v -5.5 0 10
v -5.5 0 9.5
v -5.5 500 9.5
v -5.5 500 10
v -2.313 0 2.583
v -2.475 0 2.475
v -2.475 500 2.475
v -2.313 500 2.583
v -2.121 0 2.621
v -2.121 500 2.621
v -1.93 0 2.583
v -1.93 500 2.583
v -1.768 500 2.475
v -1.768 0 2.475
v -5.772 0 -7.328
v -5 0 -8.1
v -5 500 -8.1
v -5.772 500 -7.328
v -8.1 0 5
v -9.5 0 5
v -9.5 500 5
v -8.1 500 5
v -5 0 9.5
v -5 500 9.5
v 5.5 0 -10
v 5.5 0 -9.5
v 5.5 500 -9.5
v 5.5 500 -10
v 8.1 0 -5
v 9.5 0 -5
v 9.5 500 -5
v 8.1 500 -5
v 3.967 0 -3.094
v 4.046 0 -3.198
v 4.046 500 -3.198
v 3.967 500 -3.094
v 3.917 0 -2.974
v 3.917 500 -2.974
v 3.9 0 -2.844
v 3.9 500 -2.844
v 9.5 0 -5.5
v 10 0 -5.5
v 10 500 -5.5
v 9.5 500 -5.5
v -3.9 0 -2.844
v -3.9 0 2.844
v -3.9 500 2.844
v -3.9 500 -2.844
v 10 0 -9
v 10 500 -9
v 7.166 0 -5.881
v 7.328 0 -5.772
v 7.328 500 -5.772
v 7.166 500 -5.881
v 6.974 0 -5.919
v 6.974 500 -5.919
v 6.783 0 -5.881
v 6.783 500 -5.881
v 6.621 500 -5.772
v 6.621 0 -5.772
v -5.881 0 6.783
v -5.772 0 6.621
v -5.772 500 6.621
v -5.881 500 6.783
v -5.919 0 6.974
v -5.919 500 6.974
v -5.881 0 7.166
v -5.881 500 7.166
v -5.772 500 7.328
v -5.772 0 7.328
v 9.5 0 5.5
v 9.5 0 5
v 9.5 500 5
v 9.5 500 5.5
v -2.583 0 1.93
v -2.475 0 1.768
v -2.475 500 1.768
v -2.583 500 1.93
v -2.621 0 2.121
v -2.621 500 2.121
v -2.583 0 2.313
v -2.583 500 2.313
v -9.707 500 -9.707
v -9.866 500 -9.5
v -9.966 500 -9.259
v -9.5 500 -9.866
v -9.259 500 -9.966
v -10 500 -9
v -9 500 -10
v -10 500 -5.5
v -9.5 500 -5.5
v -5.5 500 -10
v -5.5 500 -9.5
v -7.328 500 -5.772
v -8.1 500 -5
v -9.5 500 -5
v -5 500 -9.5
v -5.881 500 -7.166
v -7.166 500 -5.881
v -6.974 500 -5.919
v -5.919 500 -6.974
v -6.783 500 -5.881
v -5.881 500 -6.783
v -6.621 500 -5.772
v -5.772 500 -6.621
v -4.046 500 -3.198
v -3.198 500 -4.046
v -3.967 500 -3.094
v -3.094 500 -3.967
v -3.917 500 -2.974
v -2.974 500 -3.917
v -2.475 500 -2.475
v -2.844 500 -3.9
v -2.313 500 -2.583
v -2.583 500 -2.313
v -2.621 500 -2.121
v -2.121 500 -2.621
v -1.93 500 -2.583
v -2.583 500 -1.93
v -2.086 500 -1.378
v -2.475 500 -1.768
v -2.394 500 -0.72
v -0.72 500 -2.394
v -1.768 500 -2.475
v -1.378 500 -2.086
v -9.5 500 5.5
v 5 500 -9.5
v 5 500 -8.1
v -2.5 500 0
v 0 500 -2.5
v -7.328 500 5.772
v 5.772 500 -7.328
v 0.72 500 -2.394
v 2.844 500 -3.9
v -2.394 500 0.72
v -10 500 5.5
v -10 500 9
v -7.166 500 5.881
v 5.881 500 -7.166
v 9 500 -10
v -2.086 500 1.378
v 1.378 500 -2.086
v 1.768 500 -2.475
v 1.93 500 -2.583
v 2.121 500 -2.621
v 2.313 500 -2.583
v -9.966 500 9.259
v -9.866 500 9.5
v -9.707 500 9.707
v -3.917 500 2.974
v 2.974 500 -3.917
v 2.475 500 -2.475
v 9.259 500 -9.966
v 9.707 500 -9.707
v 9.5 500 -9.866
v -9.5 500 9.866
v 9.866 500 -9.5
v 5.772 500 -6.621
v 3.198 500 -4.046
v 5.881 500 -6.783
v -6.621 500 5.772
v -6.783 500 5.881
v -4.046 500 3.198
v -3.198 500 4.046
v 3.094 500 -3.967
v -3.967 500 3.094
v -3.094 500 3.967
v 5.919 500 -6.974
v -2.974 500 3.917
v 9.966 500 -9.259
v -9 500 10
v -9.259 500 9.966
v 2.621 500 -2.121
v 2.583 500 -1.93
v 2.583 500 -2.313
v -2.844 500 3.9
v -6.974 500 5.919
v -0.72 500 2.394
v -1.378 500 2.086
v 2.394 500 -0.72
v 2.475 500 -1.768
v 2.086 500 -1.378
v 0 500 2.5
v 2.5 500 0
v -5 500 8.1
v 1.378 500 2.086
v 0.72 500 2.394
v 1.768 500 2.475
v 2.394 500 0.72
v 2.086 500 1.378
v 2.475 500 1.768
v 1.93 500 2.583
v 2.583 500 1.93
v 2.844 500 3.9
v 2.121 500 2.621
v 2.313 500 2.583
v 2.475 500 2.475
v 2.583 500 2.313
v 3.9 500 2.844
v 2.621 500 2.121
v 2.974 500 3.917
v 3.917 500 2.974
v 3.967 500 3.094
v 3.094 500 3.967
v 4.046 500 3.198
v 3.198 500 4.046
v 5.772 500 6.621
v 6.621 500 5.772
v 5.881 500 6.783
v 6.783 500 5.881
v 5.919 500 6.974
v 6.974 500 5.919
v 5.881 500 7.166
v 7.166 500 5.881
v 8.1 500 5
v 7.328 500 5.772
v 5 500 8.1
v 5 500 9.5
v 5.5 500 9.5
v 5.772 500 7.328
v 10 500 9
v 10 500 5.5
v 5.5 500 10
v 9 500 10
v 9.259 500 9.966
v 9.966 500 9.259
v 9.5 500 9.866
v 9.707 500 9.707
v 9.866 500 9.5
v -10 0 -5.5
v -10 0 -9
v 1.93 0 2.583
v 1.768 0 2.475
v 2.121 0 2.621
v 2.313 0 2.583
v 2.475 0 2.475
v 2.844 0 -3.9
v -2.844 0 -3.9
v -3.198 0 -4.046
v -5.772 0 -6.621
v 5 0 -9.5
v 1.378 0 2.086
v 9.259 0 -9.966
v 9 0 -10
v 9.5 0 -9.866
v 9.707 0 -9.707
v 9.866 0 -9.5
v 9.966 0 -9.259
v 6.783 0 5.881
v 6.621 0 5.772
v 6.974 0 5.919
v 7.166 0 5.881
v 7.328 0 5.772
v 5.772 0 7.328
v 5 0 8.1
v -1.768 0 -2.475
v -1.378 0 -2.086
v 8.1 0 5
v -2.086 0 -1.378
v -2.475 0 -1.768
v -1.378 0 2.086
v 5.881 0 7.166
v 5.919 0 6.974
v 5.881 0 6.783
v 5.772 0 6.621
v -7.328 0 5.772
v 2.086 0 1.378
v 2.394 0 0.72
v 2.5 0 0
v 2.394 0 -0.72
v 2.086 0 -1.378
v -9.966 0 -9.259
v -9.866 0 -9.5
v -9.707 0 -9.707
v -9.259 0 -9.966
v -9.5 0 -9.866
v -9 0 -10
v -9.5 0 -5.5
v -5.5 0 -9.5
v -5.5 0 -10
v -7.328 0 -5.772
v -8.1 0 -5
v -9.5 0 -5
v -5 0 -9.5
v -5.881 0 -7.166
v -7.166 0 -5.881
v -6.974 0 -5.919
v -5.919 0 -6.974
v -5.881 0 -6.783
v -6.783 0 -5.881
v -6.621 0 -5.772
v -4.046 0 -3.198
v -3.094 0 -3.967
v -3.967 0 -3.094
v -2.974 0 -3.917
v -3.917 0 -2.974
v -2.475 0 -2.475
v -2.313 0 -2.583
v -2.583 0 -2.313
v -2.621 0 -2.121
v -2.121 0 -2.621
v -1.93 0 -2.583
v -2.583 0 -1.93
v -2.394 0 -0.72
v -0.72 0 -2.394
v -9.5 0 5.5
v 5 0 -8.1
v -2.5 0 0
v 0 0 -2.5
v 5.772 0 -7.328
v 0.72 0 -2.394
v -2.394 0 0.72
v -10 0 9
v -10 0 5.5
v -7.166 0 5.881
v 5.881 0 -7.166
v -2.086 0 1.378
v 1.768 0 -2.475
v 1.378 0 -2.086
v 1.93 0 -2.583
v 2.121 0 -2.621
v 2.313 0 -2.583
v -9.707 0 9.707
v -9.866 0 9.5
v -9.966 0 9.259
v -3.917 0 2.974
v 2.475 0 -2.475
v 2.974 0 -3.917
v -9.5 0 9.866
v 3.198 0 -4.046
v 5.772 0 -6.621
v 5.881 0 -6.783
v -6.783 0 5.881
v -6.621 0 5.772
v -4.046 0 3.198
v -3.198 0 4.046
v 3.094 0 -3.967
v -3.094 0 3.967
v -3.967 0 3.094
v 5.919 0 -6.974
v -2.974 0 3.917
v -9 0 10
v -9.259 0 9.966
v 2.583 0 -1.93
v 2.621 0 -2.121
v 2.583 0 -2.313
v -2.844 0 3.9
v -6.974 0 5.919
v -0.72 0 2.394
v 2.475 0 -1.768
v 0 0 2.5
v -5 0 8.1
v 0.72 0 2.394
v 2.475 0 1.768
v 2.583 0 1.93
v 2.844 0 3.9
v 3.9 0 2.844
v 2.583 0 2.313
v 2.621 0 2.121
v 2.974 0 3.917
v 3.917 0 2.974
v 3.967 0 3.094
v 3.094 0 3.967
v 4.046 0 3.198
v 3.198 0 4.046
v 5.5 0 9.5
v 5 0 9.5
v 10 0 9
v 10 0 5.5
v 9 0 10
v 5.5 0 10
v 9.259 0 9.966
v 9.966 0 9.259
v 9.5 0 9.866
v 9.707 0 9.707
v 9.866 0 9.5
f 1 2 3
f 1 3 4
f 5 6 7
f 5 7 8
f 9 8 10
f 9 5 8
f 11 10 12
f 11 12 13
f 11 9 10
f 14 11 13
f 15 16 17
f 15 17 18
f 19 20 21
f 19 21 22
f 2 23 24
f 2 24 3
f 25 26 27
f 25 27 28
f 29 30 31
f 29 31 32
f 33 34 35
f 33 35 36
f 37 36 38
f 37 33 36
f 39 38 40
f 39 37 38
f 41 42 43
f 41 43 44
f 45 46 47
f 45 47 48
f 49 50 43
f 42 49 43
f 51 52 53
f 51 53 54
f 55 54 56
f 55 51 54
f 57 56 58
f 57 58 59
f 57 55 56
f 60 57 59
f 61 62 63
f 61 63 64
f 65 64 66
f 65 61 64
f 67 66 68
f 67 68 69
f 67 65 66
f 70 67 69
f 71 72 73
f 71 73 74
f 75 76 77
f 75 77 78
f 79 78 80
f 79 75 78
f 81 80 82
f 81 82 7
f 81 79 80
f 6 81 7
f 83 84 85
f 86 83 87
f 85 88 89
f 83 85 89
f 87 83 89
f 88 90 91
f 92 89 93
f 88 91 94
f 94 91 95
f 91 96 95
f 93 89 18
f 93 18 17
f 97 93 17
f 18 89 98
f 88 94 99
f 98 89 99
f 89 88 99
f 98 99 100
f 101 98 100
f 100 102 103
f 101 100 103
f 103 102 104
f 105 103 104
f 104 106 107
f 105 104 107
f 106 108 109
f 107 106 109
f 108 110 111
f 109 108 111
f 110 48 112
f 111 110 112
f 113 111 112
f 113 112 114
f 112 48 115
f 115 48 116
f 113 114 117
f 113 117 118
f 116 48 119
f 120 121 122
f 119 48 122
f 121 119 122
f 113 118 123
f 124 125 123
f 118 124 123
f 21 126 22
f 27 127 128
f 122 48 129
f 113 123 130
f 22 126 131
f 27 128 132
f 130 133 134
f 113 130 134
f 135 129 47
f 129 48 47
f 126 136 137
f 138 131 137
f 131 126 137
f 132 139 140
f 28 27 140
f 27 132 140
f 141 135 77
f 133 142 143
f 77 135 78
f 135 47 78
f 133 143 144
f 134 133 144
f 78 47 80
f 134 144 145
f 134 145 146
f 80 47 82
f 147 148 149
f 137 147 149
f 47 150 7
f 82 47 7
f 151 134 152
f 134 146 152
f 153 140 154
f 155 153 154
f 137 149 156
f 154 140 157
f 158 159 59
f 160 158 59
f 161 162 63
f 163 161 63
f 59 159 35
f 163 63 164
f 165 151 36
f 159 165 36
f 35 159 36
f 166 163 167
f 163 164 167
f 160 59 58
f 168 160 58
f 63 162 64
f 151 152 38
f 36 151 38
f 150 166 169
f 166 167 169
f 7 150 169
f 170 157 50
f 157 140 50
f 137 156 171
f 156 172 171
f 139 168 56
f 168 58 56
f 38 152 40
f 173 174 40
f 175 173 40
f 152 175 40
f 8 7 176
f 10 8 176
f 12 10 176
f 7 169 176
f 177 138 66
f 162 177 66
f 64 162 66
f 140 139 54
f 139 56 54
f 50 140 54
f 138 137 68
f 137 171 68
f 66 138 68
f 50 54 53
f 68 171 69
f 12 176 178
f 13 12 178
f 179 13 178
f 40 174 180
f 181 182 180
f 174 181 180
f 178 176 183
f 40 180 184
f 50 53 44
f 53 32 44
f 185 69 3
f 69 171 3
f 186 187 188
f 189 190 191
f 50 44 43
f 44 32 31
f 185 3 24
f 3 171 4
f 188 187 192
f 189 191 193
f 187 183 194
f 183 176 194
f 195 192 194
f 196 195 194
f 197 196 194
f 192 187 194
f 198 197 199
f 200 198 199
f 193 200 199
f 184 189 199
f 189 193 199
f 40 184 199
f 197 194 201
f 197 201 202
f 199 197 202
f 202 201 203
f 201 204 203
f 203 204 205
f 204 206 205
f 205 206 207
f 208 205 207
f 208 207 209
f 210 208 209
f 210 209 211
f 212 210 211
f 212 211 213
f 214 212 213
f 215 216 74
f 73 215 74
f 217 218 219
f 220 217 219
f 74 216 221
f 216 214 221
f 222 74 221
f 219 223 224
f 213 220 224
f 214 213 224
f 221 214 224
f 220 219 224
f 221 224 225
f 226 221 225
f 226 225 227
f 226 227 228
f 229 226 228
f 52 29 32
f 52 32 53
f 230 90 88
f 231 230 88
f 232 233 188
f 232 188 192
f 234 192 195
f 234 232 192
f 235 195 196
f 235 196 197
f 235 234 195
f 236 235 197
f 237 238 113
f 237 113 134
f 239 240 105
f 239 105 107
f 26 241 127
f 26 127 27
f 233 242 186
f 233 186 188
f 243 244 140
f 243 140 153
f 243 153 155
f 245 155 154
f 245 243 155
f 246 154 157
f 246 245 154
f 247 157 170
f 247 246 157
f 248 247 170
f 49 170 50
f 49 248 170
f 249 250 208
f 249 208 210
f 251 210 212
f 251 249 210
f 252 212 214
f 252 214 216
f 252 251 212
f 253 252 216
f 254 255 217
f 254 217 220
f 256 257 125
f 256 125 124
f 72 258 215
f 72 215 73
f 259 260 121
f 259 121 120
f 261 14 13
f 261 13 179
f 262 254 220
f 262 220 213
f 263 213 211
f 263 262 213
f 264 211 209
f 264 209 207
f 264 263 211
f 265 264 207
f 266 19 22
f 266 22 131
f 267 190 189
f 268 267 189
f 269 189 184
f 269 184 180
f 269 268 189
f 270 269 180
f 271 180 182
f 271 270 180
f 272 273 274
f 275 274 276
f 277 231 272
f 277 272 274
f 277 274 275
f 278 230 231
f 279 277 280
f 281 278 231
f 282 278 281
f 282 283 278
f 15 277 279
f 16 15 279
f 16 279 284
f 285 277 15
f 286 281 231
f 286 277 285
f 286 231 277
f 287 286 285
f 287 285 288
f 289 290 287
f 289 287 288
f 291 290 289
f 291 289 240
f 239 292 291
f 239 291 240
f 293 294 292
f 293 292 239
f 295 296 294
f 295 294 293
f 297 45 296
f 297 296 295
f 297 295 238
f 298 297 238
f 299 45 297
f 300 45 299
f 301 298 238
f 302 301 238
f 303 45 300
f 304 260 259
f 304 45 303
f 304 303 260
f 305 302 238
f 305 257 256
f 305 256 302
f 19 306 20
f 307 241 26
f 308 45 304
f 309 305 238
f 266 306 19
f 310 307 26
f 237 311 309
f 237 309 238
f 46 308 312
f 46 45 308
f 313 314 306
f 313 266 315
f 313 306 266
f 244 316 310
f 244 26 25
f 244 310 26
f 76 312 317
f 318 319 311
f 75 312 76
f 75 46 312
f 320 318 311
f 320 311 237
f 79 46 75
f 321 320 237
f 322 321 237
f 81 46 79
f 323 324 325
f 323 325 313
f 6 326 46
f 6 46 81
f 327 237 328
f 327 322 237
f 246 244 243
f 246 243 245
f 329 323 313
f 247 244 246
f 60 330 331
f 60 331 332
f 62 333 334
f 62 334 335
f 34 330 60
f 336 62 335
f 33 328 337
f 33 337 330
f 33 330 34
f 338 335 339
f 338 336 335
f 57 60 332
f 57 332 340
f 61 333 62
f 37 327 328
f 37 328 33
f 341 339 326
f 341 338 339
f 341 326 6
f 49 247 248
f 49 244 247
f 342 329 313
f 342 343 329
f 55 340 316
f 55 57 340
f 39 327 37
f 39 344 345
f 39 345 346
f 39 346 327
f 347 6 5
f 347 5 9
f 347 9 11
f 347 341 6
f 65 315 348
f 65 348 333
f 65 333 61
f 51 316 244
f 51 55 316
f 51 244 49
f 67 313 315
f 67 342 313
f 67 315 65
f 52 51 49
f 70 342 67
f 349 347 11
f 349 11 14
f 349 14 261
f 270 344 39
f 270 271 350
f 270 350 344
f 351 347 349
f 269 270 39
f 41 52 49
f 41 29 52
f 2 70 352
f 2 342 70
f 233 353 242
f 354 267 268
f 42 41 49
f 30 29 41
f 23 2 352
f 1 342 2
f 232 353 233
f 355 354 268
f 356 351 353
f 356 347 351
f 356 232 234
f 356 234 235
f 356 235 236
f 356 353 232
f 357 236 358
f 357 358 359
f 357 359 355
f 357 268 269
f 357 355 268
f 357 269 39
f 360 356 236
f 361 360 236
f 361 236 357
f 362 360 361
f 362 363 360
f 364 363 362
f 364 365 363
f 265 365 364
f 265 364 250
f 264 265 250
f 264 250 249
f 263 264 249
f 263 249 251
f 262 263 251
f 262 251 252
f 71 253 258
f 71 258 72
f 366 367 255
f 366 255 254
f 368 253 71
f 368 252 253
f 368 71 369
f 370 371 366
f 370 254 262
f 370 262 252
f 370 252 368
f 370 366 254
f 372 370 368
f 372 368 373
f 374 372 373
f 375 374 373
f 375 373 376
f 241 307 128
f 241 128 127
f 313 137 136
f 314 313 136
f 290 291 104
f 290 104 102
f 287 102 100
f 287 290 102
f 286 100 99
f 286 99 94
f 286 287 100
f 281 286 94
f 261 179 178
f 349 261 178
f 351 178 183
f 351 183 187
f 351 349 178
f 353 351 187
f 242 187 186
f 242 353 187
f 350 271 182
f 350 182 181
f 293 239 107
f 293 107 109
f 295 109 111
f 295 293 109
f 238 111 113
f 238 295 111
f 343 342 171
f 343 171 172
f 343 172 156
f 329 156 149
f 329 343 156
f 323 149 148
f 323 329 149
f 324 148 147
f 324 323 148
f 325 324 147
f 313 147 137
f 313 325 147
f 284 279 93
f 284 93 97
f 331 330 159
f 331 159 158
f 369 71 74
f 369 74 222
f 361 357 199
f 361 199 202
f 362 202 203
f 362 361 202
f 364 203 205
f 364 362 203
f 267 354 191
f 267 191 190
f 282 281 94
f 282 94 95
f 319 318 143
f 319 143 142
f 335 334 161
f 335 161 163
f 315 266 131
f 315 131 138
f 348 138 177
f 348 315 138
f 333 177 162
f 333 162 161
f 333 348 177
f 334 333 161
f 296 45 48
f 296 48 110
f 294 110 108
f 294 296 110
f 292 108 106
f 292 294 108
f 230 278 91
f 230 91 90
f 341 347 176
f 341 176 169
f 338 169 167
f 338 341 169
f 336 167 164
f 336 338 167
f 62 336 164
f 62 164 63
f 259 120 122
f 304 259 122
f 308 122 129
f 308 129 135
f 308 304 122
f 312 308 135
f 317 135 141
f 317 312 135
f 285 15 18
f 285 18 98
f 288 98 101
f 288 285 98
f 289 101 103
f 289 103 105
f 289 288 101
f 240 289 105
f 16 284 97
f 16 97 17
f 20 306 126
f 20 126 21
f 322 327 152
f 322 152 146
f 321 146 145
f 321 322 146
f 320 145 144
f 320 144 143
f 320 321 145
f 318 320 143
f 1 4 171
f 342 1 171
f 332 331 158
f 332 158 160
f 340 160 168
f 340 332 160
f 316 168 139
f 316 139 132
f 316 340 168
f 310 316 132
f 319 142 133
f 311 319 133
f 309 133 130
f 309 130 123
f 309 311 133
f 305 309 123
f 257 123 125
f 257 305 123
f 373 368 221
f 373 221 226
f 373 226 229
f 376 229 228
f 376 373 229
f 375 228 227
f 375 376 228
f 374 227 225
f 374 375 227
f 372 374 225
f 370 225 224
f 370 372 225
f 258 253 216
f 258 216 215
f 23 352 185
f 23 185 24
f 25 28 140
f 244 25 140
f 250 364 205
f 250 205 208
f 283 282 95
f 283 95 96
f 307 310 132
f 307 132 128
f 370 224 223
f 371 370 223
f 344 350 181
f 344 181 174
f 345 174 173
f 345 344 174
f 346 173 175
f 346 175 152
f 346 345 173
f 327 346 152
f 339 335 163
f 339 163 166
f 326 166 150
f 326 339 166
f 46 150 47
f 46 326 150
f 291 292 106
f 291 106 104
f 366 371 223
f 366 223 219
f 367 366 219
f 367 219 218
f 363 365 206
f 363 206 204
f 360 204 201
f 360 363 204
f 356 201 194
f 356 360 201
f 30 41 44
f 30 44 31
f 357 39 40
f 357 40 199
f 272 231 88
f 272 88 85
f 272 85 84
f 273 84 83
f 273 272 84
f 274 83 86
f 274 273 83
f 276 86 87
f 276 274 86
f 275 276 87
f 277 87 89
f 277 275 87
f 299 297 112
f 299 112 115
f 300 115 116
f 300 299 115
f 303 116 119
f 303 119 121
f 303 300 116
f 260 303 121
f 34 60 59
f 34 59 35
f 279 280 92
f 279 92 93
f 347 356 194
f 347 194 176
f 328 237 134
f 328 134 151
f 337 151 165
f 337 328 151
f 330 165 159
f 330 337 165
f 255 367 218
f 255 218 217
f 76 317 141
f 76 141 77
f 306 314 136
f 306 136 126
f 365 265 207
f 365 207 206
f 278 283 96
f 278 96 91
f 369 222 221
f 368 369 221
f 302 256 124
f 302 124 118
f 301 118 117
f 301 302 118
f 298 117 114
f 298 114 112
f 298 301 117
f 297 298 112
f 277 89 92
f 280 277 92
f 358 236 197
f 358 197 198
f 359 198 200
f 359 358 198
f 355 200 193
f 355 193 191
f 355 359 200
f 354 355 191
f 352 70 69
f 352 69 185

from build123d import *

# Parameters (mm, degrees)
F1_DEPTH = 500


with BuildPart() as f1:
    # F0 (on Front) → F1 (new body)
    with BuildSketch(Plane.XZ):
        with BuildLine():
            Line((-10, 9), (-10, 5.5))
            Line((-10, 5.5), (-9.5, 5.5))
            Line((-9.5, 5.5), (-9.5, 5))
            Line((-9.5, 5), (-8.1, 5))
            Line((-8.1, 5), (-7.327817, 5.772183))
            ThreePointArc((-7.327817, 5.772183), (-6.974264, 5.918629), (-6.620711, 5.772183))
            Line((-6.620711, 5.772183), (-4.046447, 3.197918))
            ThreePointArc((-4.046447, 3.197918), (-3.93806, 3.035707), (-3.9, 2.844365))
            Line((-3.9, 2.844365), (-3.9, -2.844365))
            ThreePointArc((-3.9, -2.844365), (-3.93806, -3.035707), (-4.046447, -3.197918))
            Line((-4.046447, -3.197918), (-6.620711, -5.772183))
            ThreePointArc((-6.620711, -5.772183), (-6.974264, -5.918629), (-7.327817, -5.772183))
            Line((-7.327817, -5.772183), (-8.1, -5))
            Line((-8.1, -5), (-9.5, -5))
            Line((-9.5, -5), (-9.5, -5.5))
            Line((-9.5, -5.5), (-10, -5.5))
            Line((-10, -5.5), (-10, -9))
            ThreePointArc((-10, -9), (-9.707107, -9.707107), (-9, -10))
            Line((-9, -10), (-5.5, -10))
            Line((-5.5, -10), (-5.5, -9.5))
            Line((-5.5, -9.5), (-5, -9.5))
            Line((-5, -9.5), (-5, -8.1))
            Line((-5, -8.1), (-5.772183, -7.327817))
            ThreePointArc((-5.772183, -7.327817), (-5.918629, -6.974264), (-5.772183, -6.620711))
            Line((-5.772183, -6.620711), (-3.197918, -4.046447))
            ThreePointArc((-3.197918, -4.046447), (-3.035707, -3.93806), (-2.844365, -3.9))
            Line((-2.844365, -3.9), (2.844365, -3.9))
            ThreePointArc((2.844365, -3.9), (3.035707, -3.93806), (3.197918, -4.046447))
            Line((3.197918, -4.046447), (5.772183, -6.620711))
            ThreePointArc((5.772183, -6.620711), (5.918629, -6.974264), (5.772183, -7.327817))
            Line((5.772183, -7.327817), (5, -8.1))
            Line((5, -8.1), (5, -9.5))
            Line((5, -9.5), (5.5, -9.5))
            Line((5.5, -9.5), (5.5, -10))
            Line((5.5, -10), (9, -10))
            ThreePointArc((9, -10), (9.707107, -9.707107), (10, -9))
            Line((10, -9), (10, -5.5))
            Line((10, -5.5), (9.5, -5.5))
            Line((9.5, -5.5), (9.5, -5))
            Line((9.5, -5), (8.1, -5))
            Line((8.1, -5), (7.327817, -5.772183))
            ThreePointArc((7.327817, -5.772183), (6.974264, -5.918629), (6.620711, -5.772183))
            Line((6.620711, -5.772183), (4.046447, -3.197918))
            ThreePointArc((4.046447, -3.197918), (3.93806, -3.035707), (3.9, -2.844365))
            Line((3.9, -2.844365), (3.9, 2.844365))
            ThreePointArc((3.9, 2.844365), (3.93806, 3.035707), (4.046447, 3.197918))
            Line((4.046447, 3.197918), (6.620711, 5.772183))
            ThreePointArc((6.620711, 5.772183), (6.974264, 5.918629), (7.327817, 5.772183))
            Line((7.327817, 5.772183), (8.1, 5))
            Line((8.1, 5), (9.5, 5))
            Line((9.5, 5), (9.5, 5.5))
            Line((9.5, 5.5), (10, 5.5))
            Line((10, 5.5), (10, 9))
            ThreePointArc((10, 9), (9.707107, 9.707107), (9, 10))
            Line((9, 10), (5.5, 10))
            Line((5.5, 10), (5.5, 9.5))
            Line((5.5, 9.5), (5, 9.5))
            Line((5, 9.5), (5, 8.1))
            Line((5, 8.1), (5.772183, 7.327817))
            ThreePointArc((5.772183, 7.327817), (5.918629, 6.974264), (5.772183, 6.620711))
            Line((5.772183, 6.620711), (3.197918, 4.046447))
            ThreePointArc((3.197918, 4.046447), (3.035707, 3.93806), (2.844365, 3.9))
            Line((2.844365, 3.9), (-2.844365, 3.9))
            ThreePointArc((-2.844365, 3.9), (-3.035707, 3.93806), (-3.197918, 4.046447))
            Line((-3.197918, 4.046447), (-5.772183, 6.620711))
            ThreePointArc((-5.772183, 6.620711), (-5.918629, 6.974264), (-5.772183, 7.327817))
            Line((-5.772183, 7.327817), (-5, 8.1))
            Line((-5, 8.1), (-5, 9.5))
            Line((-5, 9.5), (-5.5, 9.5))
            Line((-5.5, 9.5), (-5.5, 10))
            Line((-5.5, 10), (-9, 10))
            ThreePointArc((-9, 10), (-9.707107, 9.707107), (-10, 9))
        make_face()
        with BuildLine():
            ThreePointArc((-2.085604, -1.378497), (-2.5, 0), (-2.085604, 1.378497))
            Line((-2.085604, 1.378497), (-2.474874, 1.767767))
            ThreePointArc((-2.474874, 1.767767), (-2.62132, 2.12132), (-2.474874, 2.474874))
            ThreePointArc((-2.474874, 2.474874), (-2.12132, 2.62132), (-1.767767, 2.474874))
            Line((-1.767767, 2.474874), (-1.378497, 2.085604))
            ThreePointArc((-1.378497, 2.085604), (0, 2.5), (1.378497, 2.085604))
            Line((1.378497, 2.085604), (1.767767, 2.474874))
            ThreePointArc((1.767767, 2.474874), (2.12132, 2.62132), (2.474874, 2.474874))
            ThreePointArc((2.474874, 2.474874), (2.62132, 2.12132), (2.474874, 1.767767))
            Line((2.474874, 1.767767), (2.085604, 1.378497))
            ThreePointArc((2.085604, 1.378497), (2.5, 0), (2.085604, -1.378497))
            Line((2.085604, -1.378497), (2.474874, -1.767767))
            ThreePointArc((2.474874, -1.767767), (2.62132, -2.12132), (2.474874, -2.474874))
            ThreePointArc((2.474874, -2.474874), (2.12132, -2.62132), (1.767767, -2.474874))
            Line((1.767767, -2.474874), (1.378497, -2.085604))
            ThreePointArc((1.378497, -2.085604), (0, -2.5), (-1.378497, -2.085604))
            Line((-1.378497, -2.085604), (-1.767767, -2.474874))
            ThreePointArc((-1.767767, -2.474874), (-2.12132, -2.62132), (-2.474874, -2.474874))
            ThreePointArc((-2.474874, -2.474874), (-2.62132, -2.12132), (-2.474874, -1.767767))
            Line((-2.474874, -1.767767), (-2.085604, -1.378497))
        make_face(mode=Mode.SUBTRACT)
    extrude(amount=-F1_DEPTH)


solid = f1.part
